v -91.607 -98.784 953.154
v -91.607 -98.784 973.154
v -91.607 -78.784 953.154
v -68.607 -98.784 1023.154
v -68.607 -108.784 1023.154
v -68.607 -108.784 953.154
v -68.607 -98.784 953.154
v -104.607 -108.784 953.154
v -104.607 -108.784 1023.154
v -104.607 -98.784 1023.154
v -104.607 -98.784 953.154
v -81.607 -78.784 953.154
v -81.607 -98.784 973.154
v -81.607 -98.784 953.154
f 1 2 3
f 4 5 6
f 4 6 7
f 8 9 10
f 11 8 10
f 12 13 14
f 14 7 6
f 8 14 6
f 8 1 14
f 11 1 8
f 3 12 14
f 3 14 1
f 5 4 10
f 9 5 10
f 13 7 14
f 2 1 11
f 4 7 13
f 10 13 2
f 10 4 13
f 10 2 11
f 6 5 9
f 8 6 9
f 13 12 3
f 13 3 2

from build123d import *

# Parameters (mm, degrees)
SKETCH_1_W           = 36
SKETCH_1_H           = 10
EXTRUDE_1_DEPTH      = 70
EXTRUDE_2_DEPTH      = 5
EXTRUDE_2_DEPTH_BACK = 5


with BuildPart() as part:
    # 草图1 → 凸台-拉伸1 (new body)
    with BuildSketch(Plane(origin=(0, 0, 1023.154259328), x_dir=(-1, 0, 0), z_dir=(0, 0, -1))):
        with Locations((86.606649797, -103.783530386)):
            Rectangle(SKETCH_1_W, SKETCH_1_H)
    extrude(amount=EXTRUDE_1_DEPTH)

    # 草图3 → 凸台-拉伸2 (add, two sides: drawn at the far end of the back side and taken through both)
    with BuildSketch(Plane.ZY.offset(86.606649797).offset(-EXTRUDE_2_DEPTH_BACK)):
        Polygon((953.154259328, -98.783530386), (953.154259328, -78.783530386), (973.154259328, -98.783530386), align=None)
    extrude(amount=EXTRUDE_2_DEPTH + EXTRUDE_2_DEPTH_BACK)


solid = part.part
